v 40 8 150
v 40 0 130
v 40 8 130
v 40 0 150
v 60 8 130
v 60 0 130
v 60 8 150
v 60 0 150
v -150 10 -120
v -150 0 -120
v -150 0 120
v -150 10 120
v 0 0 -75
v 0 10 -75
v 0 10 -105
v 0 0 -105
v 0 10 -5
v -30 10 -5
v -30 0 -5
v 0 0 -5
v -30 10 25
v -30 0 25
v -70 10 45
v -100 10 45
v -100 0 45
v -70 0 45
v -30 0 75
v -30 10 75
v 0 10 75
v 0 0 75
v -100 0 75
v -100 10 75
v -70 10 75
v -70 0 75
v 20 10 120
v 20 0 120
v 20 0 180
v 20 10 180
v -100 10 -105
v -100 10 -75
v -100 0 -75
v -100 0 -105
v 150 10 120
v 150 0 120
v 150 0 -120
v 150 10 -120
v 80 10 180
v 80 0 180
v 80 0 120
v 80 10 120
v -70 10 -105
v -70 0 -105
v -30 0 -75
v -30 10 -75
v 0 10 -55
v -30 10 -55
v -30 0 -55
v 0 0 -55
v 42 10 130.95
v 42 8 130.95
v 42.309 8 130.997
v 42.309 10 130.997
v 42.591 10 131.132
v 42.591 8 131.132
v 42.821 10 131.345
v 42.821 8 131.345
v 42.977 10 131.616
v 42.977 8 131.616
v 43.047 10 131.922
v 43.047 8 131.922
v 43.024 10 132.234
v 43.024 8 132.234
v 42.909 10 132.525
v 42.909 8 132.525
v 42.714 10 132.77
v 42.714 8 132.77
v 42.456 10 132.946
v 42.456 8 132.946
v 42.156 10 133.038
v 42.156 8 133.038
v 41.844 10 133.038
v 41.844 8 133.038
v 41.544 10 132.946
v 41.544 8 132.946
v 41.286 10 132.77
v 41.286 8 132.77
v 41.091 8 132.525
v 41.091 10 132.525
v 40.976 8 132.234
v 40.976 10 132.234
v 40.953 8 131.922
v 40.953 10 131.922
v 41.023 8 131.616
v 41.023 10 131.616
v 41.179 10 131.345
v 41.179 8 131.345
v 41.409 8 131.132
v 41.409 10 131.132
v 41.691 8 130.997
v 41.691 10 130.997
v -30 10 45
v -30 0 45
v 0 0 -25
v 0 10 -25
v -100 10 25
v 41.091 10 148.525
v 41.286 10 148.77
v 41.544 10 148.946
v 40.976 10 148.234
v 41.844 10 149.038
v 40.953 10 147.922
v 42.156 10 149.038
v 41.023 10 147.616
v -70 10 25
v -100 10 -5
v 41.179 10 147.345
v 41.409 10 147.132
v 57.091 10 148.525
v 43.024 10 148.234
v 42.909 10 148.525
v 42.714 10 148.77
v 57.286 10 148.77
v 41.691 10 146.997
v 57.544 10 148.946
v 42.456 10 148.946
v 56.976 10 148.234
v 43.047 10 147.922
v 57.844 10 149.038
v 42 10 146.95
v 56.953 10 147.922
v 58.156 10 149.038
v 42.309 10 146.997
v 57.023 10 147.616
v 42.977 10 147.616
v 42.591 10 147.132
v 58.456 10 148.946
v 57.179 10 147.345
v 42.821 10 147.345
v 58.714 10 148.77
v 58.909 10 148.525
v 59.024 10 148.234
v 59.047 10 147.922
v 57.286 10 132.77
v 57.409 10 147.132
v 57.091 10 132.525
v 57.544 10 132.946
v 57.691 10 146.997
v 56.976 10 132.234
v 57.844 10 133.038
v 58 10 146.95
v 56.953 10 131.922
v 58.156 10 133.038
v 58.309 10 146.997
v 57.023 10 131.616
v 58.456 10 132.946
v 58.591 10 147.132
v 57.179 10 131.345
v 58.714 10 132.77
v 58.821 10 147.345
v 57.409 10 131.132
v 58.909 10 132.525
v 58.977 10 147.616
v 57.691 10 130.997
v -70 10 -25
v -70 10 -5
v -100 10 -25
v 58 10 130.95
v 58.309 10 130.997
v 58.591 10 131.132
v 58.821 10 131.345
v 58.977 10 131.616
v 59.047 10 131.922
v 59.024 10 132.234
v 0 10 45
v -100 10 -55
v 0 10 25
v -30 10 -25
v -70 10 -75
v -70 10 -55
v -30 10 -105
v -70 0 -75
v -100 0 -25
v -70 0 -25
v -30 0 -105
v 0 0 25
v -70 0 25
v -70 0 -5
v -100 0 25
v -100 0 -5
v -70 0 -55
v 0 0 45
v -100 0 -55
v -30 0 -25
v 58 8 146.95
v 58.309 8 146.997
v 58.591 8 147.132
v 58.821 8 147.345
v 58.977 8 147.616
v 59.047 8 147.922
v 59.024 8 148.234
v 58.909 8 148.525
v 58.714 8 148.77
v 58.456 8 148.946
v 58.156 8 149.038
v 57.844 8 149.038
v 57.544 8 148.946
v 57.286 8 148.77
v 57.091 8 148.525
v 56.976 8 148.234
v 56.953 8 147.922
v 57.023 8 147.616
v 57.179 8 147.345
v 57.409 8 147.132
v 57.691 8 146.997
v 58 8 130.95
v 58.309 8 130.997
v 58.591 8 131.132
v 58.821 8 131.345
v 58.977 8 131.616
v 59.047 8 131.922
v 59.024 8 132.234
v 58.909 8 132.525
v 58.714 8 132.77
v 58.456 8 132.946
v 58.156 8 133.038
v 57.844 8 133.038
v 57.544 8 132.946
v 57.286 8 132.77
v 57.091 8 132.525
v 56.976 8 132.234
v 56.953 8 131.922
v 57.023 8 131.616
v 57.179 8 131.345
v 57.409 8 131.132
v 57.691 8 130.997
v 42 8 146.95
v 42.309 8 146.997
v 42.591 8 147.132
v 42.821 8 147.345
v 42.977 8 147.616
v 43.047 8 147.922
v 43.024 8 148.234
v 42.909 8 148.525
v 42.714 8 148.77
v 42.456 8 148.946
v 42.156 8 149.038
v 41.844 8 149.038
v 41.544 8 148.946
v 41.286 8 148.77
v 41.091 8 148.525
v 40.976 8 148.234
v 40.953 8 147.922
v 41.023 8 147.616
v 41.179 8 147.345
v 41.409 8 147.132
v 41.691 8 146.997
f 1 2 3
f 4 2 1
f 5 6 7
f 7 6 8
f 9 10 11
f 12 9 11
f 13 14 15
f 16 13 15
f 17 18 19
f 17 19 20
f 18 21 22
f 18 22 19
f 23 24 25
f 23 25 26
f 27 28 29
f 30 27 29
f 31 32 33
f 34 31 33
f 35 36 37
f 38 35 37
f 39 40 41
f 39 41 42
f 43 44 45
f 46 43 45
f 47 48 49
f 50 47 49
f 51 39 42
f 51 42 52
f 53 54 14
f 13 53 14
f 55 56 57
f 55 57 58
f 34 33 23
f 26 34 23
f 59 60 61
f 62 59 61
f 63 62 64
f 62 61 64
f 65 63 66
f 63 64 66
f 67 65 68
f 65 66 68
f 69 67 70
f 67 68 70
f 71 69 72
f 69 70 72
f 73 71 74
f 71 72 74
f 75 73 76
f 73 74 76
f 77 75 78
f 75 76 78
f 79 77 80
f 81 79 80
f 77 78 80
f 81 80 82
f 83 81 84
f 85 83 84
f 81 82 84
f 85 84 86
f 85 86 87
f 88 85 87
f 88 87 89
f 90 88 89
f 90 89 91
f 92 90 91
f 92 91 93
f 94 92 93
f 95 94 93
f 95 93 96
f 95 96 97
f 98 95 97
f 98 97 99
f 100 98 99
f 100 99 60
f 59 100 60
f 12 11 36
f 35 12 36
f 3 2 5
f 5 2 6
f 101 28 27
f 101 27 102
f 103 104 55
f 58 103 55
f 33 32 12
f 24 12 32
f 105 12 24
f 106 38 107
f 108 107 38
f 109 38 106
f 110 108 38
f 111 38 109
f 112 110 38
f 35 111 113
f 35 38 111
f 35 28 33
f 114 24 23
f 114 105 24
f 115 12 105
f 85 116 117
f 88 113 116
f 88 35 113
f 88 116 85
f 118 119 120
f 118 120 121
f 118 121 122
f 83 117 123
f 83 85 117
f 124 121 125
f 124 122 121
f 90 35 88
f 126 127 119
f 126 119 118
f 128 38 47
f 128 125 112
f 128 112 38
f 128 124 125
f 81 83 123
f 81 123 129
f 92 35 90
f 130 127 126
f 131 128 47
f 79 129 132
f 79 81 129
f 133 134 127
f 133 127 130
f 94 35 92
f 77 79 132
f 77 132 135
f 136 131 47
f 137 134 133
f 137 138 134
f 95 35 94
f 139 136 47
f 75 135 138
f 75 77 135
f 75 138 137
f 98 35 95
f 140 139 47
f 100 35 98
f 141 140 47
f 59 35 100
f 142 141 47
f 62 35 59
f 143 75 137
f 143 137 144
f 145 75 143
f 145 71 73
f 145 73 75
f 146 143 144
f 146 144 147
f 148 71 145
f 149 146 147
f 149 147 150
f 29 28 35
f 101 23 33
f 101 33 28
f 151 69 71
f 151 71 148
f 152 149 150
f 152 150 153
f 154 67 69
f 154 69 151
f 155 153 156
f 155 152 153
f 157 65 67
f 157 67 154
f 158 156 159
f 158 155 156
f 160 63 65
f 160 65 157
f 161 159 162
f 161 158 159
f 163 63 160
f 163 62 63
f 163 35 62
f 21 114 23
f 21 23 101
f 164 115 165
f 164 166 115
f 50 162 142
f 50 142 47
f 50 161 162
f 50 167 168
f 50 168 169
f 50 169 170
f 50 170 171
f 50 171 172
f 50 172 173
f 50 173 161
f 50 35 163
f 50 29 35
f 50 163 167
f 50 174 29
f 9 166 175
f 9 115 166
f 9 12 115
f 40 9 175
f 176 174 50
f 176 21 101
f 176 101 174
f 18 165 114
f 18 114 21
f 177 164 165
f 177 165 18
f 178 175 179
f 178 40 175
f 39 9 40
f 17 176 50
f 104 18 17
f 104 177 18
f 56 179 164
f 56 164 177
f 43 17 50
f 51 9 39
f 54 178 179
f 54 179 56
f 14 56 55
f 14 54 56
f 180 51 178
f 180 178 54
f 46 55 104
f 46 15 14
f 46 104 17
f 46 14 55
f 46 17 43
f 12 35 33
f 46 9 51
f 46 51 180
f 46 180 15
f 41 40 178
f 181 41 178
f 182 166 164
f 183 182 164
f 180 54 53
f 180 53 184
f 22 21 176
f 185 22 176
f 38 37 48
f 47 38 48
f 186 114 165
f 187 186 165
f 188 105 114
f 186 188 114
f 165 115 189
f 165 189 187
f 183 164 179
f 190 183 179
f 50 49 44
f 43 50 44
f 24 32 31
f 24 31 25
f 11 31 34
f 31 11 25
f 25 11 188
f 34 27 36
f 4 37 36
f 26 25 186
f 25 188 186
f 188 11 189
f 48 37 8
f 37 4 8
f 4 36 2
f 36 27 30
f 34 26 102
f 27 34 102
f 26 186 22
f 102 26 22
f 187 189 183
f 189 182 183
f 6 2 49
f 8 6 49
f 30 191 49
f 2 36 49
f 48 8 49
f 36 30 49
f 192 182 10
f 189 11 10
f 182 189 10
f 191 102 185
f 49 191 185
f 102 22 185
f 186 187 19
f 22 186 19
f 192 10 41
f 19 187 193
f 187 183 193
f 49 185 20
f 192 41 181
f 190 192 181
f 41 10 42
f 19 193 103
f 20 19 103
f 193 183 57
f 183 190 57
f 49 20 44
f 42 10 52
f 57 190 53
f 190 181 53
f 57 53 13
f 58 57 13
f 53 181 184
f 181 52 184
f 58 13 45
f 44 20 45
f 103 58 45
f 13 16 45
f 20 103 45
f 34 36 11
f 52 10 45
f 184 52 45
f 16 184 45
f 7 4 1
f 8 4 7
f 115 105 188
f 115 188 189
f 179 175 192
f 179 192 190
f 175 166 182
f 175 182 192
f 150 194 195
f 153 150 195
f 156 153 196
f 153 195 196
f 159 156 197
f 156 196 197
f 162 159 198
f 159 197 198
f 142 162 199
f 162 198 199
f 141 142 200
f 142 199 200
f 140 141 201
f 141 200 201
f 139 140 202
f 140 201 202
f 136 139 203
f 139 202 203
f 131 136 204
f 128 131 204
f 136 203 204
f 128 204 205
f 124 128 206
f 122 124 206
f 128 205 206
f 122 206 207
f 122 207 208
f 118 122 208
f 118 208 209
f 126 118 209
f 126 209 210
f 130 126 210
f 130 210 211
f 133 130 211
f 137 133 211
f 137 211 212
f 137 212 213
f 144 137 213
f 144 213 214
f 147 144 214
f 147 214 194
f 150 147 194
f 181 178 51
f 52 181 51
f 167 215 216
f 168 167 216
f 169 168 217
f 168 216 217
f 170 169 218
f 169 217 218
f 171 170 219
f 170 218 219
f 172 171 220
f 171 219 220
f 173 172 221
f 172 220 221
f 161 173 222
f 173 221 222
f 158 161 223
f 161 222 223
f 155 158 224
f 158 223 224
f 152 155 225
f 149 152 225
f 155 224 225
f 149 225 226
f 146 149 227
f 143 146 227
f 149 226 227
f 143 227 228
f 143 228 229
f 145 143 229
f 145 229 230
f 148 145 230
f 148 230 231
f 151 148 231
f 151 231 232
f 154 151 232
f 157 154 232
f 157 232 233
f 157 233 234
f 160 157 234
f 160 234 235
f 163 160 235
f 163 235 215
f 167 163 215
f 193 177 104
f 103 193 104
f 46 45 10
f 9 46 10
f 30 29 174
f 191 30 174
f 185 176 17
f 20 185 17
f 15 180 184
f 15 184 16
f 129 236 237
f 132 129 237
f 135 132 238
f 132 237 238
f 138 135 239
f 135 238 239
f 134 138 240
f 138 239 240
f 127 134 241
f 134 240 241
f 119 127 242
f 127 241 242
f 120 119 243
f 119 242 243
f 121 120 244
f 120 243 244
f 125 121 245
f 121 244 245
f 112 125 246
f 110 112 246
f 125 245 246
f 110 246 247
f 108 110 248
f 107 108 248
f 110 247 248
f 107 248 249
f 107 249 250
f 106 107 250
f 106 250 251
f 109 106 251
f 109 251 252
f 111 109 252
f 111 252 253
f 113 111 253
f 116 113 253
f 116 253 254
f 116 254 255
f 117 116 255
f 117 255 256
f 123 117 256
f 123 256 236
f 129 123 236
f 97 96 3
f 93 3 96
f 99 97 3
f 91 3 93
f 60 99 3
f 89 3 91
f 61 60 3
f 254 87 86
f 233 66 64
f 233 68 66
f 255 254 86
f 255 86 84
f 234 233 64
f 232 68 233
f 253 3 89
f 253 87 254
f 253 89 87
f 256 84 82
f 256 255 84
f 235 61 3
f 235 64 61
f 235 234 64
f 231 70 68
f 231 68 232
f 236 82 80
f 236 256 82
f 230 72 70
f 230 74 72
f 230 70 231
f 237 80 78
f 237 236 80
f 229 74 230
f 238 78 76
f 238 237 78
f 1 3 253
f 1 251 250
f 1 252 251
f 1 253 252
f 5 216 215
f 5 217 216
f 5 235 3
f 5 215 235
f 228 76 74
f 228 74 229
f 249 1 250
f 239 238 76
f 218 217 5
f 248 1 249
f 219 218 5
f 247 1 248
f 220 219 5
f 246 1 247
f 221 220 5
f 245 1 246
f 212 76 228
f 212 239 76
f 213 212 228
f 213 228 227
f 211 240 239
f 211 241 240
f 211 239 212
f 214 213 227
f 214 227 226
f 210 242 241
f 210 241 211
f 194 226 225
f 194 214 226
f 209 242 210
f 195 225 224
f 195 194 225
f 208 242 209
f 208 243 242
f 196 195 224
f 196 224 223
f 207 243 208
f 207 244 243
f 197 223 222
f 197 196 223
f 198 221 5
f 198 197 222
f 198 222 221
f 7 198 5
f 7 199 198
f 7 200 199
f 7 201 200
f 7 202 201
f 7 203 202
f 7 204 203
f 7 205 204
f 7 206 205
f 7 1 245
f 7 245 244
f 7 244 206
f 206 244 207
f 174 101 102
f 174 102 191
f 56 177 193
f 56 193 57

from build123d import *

# Parameters (mm, degrees)
EXTRUDE_1_DEPTH     = 10
SKETCH_2_W          = 20
SKETCH_2_H          = 20
SKETCH_2_R          = 1.05
CUT_EXTRUDE_1_DEPTH = 8
SKETCH_2_3_R        = 1.05
CUT_EXTRUDE_2_DEPTH = 235.520787991
SKETCH_3_W          = 30
SKETCH_3_H          = 30
CUT_EXTRUDE_3_DEPTH = 235.520787991


with BuildPart() as part:
    # 草圖1 → 填料-伸長1 (new body)
    with BuildSketch(Plane(origin=(0, 0, 0), x_dir=(1, 0, 0), z_dir=(0, 1, 0))):
        Polygon((-150, -120), (20, -120), (20, -180), (80, -180), (80, -120), (150, -120), (150, 120), (-150, 120), align=None)
    extrude(amount=EXTRUDE_1_DEPTH)

    # 草圖2 → 除料-伸長1 (cut)
    with BuildSketch(Plane.XZ):
        with Locations((50, 140)):
            Rectangle(SKETCH_2_W, SKETCH_2_H)
        with Locations((42, 132)):
            Circle(SKETCH_2_R, mode=Mode.SUBTRACT)
        with Locations((58, 132)):
            Circle(SKETCH_2_R, mode=Mode.SUBTRACT)
        with Locations((42, 148)):
            Circle(SKETCH_2_R, mode=Mode.SUBTRACT)
        with Locations((58, 148)):
            Circle(SKETCH_2_R, mode=Mode.SUBTRACT)
    extrude(amount=-CUT_EXTRUDE_1_DEPTH, mode=Mode.SUBTRACT)

    # 草圖2<3> → 除料-伸長2 (cut, through all)
    with BuildSketch(Plane.XZ):
        with Locations((42, 132)):
            Circle(SKETCH_2_3_R)
        with Locations((42, 148)):
            Circle(SKETCH_2_3_R)
        with Locations((58, 132)):
            Circle(SKETCH_2_3_R)
        with Locations((58, 148)):
            Circle(SKETCH_2_3_R)
    extrude(amount=-CUT_EXTRUDE_2_DEPTH, mode=Mode.SUBTRACT)

    # 草圖3 → 除料-伸長3 (cut, through all)
    with BuildSketch(Plane(origin=(0, 10, 0), x_dir=(1, 0, 0), z_dir=(0, 1, 0))):
        with Locations((-85, -60)):
            Rectangle(SKETCH_3_W, SKETCH_3_H)
        with Locations((-85, -10)):
            Rectangle(SKETCH_3_W, SKETCH_3_H)
        with Locations((-85, 40)):
            Rectangle(SKETCH_3_W, SKETCH_3_H)
        with Locations((-85, 90)):
            Rectangle(SKETCH_3_W, SKETCH_3_H)
        with Locations((-15, -60)):
            Rectangle(SKETCH_3_W, SKETCH_3_H)
        with Locations((-15, -10)):
            Rectangle(SKETCH_3_W, SKETCH_3_H)
        with Locations((-15, 40)):
            Rectangle(SKETCH_3_W, SKETCH_3_H)
        with Locations((-15, 90)):
            Rectangle(SKETCH_3_W, SKETCH_3_H)
    extrude(amount=-CUT_EXTRUDE_3_DEPTH, mode=Mode.SUBTRACT)


solid = part.part
